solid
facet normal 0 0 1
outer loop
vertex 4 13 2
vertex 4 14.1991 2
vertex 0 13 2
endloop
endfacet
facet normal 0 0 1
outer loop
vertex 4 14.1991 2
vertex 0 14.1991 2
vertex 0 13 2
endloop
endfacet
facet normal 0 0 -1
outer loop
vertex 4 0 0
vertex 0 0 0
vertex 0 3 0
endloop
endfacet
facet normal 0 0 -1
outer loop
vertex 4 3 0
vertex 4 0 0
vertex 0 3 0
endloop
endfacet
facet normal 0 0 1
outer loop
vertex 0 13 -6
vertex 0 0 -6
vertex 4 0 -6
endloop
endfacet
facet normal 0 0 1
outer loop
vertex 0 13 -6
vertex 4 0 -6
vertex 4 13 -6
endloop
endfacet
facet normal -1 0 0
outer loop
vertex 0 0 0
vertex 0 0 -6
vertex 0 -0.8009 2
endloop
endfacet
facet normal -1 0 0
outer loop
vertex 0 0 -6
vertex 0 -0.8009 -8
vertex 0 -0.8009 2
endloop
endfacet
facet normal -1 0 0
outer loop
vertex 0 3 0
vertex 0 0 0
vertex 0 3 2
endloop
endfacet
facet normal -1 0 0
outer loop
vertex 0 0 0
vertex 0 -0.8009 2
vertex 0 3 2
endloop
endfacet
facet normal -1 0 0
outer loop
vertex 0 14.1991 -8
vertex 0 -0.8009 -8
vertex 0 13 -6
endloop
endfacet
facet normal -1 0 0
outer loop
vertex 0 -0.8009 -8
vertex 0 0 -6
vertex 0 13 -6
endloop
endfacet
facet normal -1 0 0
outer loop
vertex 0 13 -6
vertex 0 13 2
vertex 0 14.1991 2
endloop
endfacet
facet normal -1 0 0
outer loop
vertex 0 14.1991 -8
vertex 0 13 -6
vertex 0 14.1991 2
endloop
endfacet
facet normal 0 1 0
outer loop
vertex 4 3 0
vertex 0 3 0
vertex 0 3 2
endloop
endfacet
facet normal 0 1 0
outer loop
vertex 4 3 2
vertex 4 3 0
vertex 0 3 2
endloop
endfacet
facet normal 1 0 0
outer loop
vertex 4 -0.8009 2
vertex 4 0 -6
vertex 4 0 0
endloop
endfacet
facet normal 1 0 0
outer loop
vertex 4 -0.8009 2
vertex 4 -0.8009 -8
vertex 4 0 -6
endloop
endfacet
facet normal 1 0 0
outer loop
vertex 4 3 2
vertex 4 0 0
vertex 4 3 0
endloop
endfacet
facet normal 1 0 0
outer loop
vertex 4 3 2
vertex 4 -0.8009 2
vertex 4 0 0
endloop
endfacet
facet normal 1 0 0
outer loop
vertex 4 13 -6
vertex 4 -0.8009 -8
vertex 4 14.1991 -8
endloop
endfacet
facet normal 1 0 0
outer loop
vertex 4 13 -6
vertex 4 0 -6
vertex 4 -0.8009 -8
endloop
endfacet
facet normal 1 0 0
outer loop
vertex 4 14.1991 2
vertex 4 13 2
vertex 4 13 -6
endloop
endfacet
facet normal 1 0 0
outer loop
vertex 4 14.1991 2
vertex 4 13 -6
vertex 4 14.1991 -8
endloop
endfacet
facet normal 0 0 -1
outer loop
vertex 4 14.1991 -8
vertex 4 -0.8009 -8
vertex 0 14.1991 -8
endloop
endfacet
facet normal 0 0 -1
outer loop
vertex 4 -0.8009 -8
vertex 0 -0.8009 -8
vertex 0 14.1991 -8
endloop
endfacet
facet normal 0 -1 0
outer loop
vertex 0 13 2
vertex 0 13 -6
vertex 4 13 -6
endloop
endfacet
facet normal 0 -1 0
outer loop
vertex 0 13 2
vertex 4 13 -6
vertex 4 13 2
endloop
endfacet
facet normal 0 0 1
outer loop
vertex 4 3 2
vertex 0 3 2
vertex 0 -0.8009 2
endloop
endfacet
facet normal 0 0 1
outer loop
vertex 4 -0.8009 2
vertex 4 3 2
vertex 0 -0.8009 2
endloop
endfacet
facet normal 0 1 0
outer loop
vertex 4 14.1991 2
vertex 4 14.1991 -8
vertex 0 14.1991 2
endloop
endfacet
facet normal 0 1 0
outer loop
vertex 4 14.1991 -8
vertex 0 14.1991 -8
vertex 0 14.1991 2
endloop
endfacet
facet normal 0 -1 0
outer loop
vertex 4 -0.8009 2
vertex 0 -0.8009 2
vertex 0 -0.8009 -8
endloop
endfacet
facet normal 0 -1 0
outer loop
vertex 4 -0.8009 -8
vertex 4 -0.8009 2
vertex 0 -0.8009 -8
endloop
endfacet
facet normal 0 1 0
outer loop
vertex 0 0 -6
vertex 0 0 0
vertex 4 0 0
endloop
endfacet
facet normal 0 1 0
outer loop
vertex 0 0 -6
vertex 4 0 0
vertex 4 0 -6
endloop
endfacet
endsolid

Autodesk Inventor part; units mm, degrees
ref_plane "YZ Plane" through (0, 0, 0) normal (1, 0, 0) x (0, 1, 0)
ref_plane "XZ Plane" through (0, 0, 0) normal (0, 1, 0) x (-1, 0, 0)
ref_plane "XY Plane" through (0, 0, 0) normal (0, 0, 1) x (1, 0, 0)
sketch "Sketch1" plane through (0, 0, 0) normal (1, 0, 0) x (0, 1, 0)
  line L0 (0, 0) -> (0, -6)
  line L1 (0, -6) -> (13, -6)
  line L2 (0, 0) -> (3, 0)
  line L3 (3, 0) -> (3, 2)
  line L4 (3, 2) -> (1.1991, 2)
  line L5 (1.1991, 2) -> (-0.8009, 2)
  line L6 (-0.8009, 2) -> (-0.8009, -8)
  line L7 (-0.8009, -8) -> (14.1991, -8)
  line L8 (0, -3) -> (14.1991, -3)
  line L9 (14.1991, -8) -> (14.1991, -3)
  line L10 (13, -6) -> (13, -3)
  line L11 (14.1991, -3) -> (14.1991, 2)
  line L12 (14.1991, 2) -> (13, 2)
  line L13 (13, 2) -> (13, -3)
  line L14 (14.1991, -3) -> (13.349, -3)
  dimension "d0" = 6
  dimension "d1" = 13
  dimension "d2" = 2
  dimension "d3" = 2
  dimension "d4" = 10
  dimension "d5" = 15
  dimension "d6" = 5
extrude "Extrusion1" add sketch "Sketch1" along normal blind 4 contours L0 L1 L10 L8 L9 L7 L6 L5 L4 L3 L2 | L13 L12 L11 L8
sketch "Sketch3" plane through (0, 14.1991, 2) normal (0, 1, 0) x (1, 0, 0)
  line L0 (2, 1) -> (2.6492, 1)
  circle A0 centre (2, 1) radius 0.5
  point P0 (0, 2)
  dimension "d12" = 1
properties part number "Hook"
